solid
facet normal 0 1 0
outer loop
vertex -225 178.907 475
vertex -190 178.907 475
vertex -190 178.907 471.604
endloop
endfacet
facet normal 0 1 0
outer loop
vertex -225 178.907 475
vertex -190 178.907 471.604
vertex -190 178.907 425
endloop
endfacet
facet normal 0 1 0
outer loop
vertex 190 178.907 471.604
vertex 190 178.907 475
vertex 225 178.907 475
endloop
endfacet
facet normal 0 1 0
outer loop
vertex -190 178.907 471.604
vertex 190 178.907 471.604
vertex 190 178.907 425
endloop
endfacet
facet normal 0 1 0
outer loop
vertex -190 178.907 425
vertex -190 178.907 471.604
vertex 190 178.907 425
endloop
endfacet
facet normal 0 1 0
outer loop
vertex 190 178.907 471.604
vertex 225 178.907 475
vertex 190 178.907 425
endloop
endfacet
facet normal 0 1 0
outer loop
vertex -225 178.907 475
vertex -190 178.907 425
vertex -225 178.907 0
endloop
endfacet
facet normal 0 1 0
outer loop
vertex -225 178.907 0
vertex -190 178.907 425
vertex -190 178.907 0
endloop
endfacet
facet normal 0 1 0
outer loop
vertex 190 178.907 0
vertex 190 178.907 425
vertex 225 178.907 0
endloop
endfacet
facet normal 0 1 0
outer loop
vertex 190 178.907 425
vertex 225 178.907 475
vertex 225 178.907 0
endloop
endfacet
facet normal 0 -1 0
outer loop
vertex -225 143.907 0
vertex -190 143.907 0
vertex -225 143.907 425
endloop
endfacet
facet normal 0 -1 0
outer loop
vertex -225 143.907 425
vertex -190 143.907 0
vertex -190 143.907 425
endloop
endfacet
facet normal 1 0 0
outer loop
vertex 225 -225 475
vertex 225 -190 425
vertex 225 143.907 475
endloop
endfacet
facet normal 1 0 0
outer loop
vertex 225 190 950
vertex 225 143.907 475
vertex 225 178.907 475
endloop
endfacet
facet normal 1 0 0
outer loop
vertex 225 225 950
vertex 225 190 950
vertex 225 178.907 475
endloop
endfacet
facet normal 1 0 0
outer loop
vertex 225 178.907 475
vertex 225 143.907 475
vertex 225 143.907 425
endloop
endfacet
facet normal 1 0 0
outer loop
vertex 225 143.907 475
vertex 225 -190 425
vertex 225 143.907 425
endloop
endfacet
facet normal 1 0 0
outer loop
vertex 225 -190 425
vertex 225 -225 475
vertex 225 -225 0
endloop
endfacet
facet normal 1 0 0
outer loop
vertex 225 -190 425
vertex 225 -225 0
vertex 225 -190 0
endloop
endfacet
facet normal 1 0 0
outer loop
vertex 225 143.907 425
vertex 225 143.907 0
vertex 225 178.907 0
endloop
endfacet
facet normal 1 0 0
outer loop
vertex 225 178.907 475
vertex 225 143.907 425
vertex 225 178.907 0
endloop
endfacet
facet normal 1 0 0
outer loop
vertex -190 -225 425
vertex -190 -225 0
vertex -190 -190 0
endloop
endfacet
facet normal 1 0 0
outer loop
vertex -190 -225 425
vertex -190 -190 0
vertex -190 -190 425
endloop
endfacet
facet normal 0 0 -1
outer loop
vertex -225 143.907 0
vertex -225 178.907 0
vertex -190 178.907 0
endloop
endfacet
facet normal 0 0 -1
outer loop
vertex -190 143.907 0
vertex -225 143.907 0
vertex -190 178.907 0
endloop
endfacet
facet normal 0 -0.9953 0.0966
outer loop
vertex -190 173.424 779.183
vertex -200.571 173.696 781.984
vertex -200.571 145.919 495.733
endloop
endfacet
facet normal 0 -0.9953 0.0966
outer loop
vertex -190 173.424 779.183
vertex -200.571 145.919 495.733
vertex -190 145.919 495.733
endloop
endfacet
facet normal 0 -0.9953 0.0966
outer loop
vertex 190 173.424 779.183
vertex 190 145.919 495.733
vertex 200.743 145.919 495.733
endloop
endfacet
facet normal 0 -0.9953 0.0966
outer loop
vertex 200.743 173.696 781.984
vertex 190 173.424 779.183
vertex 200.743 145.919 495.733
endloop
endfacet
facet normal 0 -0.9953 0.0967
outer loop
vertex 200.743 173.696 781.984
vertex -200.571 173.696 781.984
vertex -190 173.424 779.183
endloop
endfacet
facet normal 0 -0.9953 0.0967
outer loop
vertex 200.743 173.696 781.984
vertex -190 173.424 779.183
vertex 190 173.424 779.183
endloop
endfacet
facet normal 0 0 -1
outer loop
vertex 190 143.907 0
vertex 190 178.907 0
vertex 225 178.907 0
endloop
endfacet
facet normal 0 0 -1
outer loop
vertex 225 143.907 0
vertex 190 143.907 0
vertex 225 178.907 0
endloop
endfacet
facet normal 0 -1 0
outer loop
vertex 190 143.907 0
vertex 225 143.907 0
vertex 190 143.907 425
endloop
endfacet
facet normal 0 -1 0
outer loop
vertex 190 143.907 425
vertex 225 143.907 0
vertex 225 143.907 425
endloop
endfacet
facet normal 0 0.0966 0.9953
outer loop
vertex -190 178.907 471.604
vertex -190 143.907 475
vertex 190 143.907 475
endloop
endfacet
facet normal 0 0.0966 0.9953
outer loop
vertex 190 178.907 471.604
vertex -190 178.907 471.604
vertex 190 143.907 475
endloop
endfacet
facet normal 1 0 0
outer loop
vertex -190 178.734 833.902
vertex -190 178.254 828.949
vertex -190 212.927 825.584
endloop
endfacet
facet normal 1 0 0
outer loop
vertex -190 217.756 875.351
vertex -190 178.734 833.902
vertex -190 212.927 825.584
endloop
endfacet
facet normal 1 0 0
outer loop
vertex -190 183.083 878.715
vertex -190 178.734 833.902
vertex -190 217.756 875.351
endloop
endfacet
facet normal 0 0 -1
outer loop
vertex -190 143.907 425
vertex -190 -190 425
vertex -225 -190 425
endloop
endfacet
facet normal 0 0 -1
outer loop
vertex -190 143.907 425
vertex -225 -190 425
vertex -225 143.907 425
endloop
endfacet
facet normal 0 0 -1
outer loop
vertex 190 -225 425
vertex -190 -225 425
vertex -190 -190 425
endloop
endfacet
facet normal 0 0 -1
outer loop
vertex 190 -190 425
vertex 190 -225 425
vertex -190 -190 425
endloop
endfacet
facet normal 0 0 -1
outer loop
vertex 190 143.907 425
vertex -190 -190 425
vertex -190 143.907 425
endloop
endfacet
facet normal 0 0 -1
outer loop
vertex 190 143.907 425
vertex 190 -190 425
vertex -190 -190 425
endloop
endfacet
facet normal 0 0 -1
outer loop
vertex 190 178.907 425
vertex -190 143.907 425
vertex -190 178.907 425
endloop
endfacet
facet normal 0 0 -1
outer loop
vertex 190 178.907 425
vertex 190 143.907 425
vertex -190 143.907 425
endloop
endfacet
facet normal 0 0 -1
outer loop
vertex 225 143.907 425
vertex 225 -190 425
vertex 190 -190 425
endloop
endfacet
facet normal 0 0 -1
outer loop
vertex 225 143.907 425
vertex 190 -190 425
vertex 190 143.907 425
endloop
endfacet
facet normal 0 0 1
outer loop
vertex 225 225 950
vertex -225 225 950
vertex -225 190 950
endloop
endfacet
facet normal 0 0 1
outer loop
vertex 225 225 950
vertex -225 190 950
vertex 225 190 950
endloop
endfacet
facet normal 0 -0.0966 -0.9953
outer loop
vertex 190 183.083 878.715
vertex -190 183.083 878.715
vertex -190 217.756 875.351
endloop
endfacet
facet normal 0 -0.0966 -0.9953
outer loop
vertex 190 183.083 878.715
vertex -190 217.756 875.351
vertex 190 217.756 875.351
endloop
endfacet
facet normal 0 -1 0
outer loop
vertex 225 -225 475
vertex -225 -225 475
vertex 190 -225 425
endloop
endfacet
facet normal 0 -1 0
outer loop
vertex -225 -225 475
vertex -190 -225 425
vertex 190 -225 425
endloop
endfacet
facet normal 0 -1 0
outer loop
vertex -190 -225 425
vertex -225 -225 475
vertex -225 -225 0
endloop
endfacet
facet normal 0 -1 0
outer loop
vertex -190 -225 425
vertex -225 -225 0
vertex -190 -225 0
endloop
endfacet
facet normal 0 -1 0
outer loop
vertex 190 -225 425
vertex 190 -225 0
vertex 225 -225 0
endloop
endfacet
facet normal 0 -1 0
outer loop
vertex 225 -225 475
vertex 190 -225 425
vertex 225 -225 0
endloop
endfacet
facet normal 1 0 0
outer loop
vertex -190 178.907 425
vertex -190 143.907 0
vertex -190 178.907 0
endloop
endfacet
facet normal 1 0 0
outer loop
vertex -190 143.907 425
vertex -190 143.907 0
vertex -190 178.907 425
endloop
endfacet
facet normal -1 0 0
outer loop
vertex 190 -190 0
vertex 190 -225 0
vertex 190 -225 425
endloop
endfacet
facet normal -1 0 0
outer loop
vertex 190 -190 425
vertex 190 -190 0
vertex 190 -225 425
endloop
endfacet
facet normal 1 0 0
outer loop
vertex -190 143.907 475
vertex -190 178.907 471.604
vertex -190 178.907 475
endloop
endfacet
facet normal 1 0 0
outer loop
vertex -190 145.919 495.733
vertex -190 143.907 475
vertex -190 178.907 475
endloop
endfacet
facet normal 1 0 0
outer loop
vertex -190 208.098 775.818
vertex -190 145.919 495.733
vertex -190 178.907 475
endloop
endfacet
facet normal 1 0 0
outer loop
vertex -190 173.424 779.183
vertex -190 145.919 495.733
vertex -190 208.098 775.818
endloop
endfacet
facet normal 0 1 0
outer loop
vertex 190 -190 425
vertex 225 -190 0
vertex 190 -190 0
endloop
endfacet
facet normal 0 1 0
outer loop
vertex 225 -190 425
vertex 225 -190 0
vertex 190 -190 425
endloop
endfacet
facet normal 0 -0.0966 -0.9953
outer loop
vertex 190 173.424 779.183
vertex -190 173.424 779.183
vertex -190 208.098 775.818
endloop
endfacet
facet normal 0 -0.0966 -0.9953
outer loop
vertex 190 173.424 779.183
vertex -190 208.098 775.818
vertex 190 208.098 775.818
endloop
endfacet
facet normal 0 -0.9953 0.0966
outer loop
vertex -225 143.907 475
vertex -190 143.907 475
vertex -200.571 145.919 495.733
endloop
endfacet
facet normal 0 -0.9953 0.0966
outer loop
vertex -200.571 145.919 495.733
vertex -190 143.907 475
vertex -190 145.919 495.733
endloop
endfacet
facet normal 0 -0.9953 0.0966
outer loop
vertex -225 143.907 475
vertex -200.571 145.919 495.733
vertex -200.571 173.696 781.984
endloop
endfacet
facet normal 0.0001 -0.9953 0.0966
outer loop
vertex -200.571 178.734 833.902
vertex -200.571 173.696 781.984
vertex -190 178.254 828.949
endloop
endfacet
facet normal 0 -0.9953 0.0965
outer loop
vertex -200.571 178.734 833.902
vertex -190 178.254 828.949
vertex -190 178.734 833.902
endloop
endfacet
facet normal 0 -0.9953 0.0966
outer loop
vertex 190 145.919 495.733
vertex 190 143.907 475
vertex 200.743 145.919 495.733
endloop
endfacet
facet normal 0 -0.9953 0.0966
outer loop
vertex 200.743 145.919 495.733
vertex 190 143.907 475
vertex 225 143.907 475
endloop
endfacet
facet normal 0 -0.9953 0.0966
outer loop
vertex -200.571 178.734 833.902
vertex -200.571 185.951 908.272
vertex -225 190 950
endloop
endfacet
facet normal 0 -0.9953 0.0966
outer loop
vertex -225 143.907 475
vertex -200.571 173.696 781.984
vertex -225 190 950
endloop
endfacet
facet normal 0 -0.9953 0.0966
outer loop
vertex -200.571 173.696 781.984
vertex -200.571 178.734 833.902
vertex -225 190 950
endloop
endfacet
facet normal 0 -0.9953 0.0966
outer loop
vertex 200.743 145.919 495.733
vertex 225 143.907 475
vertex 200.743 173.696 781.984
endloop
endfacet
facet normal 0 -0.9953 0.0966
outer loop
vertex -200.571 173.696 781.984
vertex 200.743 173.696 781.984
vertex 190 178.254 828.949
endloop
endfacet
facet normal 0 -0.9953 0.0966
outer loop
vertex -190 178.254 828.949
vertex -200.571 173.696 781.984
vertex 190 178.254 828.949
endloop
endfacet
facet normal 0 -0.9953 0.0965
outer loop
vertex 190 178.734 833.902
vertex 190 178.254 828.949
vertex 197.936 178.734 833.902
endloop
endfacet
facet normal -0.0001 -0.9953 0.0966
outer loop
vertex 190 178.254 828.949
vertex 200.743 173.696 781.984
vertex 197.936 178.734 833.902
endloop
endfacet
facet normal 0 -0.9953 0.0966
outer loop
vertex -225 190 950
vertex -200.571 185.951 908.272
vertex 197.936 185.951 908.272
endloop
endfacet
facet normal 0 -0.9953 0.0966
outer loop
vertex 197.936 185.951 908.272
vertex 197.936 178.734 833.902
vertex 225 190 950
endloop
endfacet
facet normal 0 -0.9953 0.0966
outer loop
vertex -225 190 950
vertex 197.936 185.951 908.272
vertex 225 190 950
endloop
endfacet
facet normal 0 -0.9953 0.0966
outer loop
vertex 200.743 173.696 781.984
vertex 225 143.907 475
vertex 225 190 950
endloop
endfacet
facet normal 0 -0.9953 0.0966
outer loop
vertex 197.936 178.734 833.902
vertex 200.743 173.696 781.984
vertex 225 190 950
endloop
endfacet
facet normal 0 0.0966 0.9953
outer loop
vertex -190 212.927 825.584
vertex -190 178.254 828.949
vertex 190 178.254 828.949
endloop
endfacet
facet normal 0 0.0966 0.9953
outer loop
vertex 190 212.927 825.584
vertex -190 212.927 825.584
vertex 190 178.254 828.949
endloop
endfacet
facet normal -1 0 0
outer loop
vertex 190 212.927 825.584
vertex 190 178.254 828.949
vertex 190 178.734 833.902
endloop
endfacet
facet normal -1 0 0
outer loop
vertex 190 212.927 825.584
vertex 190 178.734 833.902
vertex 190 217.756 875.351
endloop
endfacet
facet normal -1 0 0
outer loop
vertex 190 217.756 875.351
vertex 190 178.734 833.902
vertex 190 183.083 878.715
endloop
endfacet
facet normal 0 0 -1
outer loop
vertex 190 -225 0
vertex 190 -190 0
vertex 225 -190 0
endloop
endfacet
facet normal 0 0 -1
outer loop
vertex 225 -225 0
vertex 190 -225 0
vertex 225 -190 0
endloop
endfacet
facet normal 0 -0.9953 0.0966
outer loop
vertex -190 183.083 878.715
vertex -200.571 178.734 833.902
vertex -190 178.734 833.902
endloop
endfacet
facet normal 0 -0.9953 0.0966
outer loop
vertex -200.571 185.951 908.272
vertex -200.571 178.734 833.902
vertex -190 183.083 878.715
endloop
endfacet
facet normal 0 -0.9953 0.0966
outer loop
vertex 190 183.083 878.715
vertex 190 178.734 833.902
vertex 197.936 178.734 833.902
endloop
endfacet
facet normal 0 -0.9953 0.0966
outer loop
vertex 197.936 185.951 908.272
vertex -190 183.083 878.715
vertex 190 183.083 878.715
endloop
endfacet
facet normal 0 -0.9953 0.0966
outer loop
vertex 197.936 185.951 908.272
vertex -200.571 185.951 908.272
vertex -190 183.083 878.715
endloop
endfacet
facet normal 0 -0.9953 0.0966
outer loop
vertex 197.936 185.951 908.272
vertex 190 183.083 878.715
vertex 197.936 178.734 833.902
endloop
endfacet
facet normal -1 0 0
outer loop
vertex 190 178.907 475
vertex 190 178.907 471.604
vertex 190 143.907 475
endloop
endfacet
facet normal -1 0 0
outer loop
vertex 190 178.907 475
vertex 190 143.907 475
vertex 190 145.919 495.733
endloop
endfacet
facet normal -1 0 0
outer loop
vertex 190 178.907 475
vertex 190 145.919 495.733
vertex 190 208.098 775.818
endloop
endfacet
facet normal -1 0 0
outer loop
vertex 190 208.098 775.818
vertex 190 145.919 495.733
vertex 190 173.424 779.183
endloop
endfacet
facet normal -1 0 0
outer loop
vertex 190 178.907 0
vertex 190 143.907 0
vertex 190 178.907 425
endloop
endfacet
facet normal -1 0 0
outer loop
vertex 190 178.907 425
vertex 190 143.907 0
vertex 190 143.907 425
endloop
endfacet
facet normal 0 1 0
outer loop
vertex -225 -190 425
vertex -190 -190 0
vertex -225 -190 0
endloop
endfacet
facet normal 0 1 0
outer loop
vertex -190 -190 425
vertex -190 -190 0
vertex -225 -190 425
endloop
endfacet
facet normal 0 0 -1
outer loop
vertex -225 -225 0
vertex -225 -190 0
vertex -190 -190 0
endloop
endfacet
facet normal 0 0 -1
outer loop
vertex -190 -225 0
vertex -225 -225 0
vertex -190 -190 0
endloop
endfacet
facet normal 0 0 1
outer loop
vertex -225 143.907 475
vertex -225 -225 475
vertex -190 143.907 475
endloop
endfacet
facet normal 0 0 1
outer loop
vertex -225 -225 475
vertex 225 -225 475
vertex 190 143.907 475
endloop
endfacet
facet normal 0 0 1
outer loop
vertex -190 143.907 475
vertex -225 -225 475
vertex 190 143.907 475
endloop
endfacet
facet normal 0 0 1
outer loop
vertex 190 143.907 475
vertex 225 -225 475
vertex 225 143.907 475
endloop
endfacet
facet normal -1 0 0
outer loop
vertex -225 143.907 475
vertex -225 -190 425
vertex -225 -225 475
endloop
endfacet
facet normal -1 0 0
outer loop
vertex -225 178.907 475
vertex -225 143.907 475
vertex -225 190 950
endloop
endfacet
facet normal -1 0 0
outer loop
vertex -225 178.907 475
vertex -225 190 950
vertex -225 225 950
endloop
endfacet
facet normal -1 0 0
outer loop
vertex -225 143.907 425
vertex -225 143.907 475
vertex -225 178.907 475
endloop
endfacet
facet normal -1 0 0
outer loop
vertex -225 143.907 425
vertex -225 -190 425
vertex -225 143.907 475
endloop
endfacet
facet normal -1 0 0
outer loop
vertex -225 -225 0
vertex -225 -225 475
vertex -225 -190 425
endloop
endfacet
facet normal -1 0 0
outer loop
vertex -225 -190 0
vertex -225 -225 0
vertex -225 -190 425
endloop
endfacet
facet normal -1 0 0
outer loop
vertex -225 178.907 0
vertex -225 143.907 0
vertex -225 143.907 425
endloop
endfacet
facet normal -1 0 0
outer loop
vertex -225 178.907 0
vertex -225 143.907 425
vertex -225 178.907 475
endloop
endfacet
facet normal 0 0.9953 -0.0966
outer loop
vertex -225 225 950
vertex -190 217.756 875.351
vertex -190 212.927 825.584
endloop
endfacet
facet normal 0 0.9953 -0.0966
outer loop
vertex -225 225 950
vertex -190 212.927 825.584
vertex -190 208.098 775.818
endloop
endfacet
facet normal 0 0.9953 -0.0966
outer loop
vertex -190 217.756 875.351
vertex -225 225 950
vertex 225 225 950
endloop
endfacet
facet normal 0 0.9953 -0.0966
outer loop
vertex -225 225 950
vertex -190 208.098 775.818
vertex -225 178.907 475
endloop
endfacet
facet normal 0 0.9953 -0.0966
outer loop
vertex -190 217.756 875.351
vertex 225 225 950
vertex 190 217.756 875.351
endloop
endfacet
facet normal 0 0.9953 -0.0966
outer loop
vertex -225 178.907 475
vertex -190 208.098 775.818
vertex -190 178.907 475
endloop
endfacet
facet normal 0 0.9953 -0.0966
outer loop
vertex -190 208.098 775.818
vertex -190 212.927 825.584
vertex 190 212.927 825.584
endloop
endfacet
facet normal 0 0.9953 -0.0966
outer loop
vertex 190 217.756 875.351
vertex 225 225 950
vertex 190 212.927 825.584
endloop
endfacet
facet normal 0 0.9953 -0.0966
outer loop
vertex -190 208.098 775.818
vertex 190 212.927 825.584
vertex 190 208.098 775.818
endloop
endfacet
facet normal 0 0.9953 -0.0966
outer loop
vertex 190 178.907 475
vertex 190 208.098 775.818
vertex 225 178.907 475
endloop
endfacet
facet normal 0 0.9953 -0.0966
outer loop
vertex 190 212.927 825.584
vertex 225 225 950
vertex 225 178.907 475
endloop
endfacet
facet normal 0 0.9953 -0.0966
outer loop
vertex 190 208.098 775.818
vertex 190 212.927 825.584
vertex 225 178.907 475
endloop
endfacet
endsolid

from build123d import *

# Parameters (mm, degrees)
F0_W     = 450
F0_H     = 450
F1_DEPTH = 950
F2_W     = 46.0927397013
F2_H     = 50
F2_W_2   = 333.9072602987
F2_H_2   = 425
F3_DEPTH = 450.001
F4_W     = 398.5071629286
F4_H     = 74.7186541557
F4_W_2   = 401.3135582209
F4_H_2   = 287.5961661339
F5_DEPTH = 413.0608200261
F6_W     = 380
F6_H     = 425
F7_DEPTH = 450.001
F8_W     = 380
F8_H     = 305.6115476475
F8_H_2   = 50
F9_DEPTH = 126.5918704384


with BuildPart() as f1:
    # F0 (on Top) → F1 (new body)
    with BuildSketch(Plane.XY):
        Rectangle(F0_W, F0_H)
    extrude(amount=F1_DEPTH)

    # F2 (on face) → F3 (cut, through all)
    with BuildSketch(Plane.YZ.offset(225)):
        with Locations((201.9536301494, 450)):
            Rectangle(F2_W, F2_H)
        Polygon((-225, 950), (-225, 475), (143.9072602987, 475), (190, 950), align=None)
        Polygon((225, 950), (178.9072602987, 475), (225, 475), align=None)
        with Locations((-23.0463698506, 212.5)):
            Rectangle(F2_W_2, F2_H_2)
        with Locations((201.9536301494, 212.5)):
            Rectangle(F2_W, F2_H_2)
    extrude(amount=-F3_DEPTH, mode=Mode.SUBTRACT)

    # F4 (on face) → F5 (cut, through all)
    with BuildSketch(Plane(origin=(0, 96.9020668341, -9.4031194592), x_dir=(1, 0, 0), z_dir=(0, -0.9953248675, 0.0965836843))):
        with Locations((-1.3172850013, 884.6258819103)):
            Rectangle(F4_W, F4_H)
        with Locations((0.0859126449, 651.3064205647)):
            Rectangle(F4_W_2, F4_H_2)
    extrude(amount=F5_DEPTH, mode=Mode.SUBTRACT)

    # F6 (on face) → F7 (cut, through all)
    with BuildSketch(Plane.XZ.offset(225)):
        with Locations((0, 212.5)):
            Rectangle(F6_W, F6_H)
    extrude(amount=-F7_DEPTH, mode=Mode.SUBTRACT)

    # F8 (on face) → F9 (cut, through all)
    with BuildSketch(Plane(origin=(0, 96.9020668341, -9.4031194592), x_dir=(1, 0, 0), z_dir=(0, -0.9953248675, 0.0965836843))):
        with Locations((0, 639.4841792974)):
            Rectangle(F8_W, F8_H)
        with Locations((0, 867.2899531212)):
            Rectangle(F8_W, F8_H_2)
    extrude(amount=-F9_DEPTH, mode=Mode.SUBTRACT)


solid = f1.part
